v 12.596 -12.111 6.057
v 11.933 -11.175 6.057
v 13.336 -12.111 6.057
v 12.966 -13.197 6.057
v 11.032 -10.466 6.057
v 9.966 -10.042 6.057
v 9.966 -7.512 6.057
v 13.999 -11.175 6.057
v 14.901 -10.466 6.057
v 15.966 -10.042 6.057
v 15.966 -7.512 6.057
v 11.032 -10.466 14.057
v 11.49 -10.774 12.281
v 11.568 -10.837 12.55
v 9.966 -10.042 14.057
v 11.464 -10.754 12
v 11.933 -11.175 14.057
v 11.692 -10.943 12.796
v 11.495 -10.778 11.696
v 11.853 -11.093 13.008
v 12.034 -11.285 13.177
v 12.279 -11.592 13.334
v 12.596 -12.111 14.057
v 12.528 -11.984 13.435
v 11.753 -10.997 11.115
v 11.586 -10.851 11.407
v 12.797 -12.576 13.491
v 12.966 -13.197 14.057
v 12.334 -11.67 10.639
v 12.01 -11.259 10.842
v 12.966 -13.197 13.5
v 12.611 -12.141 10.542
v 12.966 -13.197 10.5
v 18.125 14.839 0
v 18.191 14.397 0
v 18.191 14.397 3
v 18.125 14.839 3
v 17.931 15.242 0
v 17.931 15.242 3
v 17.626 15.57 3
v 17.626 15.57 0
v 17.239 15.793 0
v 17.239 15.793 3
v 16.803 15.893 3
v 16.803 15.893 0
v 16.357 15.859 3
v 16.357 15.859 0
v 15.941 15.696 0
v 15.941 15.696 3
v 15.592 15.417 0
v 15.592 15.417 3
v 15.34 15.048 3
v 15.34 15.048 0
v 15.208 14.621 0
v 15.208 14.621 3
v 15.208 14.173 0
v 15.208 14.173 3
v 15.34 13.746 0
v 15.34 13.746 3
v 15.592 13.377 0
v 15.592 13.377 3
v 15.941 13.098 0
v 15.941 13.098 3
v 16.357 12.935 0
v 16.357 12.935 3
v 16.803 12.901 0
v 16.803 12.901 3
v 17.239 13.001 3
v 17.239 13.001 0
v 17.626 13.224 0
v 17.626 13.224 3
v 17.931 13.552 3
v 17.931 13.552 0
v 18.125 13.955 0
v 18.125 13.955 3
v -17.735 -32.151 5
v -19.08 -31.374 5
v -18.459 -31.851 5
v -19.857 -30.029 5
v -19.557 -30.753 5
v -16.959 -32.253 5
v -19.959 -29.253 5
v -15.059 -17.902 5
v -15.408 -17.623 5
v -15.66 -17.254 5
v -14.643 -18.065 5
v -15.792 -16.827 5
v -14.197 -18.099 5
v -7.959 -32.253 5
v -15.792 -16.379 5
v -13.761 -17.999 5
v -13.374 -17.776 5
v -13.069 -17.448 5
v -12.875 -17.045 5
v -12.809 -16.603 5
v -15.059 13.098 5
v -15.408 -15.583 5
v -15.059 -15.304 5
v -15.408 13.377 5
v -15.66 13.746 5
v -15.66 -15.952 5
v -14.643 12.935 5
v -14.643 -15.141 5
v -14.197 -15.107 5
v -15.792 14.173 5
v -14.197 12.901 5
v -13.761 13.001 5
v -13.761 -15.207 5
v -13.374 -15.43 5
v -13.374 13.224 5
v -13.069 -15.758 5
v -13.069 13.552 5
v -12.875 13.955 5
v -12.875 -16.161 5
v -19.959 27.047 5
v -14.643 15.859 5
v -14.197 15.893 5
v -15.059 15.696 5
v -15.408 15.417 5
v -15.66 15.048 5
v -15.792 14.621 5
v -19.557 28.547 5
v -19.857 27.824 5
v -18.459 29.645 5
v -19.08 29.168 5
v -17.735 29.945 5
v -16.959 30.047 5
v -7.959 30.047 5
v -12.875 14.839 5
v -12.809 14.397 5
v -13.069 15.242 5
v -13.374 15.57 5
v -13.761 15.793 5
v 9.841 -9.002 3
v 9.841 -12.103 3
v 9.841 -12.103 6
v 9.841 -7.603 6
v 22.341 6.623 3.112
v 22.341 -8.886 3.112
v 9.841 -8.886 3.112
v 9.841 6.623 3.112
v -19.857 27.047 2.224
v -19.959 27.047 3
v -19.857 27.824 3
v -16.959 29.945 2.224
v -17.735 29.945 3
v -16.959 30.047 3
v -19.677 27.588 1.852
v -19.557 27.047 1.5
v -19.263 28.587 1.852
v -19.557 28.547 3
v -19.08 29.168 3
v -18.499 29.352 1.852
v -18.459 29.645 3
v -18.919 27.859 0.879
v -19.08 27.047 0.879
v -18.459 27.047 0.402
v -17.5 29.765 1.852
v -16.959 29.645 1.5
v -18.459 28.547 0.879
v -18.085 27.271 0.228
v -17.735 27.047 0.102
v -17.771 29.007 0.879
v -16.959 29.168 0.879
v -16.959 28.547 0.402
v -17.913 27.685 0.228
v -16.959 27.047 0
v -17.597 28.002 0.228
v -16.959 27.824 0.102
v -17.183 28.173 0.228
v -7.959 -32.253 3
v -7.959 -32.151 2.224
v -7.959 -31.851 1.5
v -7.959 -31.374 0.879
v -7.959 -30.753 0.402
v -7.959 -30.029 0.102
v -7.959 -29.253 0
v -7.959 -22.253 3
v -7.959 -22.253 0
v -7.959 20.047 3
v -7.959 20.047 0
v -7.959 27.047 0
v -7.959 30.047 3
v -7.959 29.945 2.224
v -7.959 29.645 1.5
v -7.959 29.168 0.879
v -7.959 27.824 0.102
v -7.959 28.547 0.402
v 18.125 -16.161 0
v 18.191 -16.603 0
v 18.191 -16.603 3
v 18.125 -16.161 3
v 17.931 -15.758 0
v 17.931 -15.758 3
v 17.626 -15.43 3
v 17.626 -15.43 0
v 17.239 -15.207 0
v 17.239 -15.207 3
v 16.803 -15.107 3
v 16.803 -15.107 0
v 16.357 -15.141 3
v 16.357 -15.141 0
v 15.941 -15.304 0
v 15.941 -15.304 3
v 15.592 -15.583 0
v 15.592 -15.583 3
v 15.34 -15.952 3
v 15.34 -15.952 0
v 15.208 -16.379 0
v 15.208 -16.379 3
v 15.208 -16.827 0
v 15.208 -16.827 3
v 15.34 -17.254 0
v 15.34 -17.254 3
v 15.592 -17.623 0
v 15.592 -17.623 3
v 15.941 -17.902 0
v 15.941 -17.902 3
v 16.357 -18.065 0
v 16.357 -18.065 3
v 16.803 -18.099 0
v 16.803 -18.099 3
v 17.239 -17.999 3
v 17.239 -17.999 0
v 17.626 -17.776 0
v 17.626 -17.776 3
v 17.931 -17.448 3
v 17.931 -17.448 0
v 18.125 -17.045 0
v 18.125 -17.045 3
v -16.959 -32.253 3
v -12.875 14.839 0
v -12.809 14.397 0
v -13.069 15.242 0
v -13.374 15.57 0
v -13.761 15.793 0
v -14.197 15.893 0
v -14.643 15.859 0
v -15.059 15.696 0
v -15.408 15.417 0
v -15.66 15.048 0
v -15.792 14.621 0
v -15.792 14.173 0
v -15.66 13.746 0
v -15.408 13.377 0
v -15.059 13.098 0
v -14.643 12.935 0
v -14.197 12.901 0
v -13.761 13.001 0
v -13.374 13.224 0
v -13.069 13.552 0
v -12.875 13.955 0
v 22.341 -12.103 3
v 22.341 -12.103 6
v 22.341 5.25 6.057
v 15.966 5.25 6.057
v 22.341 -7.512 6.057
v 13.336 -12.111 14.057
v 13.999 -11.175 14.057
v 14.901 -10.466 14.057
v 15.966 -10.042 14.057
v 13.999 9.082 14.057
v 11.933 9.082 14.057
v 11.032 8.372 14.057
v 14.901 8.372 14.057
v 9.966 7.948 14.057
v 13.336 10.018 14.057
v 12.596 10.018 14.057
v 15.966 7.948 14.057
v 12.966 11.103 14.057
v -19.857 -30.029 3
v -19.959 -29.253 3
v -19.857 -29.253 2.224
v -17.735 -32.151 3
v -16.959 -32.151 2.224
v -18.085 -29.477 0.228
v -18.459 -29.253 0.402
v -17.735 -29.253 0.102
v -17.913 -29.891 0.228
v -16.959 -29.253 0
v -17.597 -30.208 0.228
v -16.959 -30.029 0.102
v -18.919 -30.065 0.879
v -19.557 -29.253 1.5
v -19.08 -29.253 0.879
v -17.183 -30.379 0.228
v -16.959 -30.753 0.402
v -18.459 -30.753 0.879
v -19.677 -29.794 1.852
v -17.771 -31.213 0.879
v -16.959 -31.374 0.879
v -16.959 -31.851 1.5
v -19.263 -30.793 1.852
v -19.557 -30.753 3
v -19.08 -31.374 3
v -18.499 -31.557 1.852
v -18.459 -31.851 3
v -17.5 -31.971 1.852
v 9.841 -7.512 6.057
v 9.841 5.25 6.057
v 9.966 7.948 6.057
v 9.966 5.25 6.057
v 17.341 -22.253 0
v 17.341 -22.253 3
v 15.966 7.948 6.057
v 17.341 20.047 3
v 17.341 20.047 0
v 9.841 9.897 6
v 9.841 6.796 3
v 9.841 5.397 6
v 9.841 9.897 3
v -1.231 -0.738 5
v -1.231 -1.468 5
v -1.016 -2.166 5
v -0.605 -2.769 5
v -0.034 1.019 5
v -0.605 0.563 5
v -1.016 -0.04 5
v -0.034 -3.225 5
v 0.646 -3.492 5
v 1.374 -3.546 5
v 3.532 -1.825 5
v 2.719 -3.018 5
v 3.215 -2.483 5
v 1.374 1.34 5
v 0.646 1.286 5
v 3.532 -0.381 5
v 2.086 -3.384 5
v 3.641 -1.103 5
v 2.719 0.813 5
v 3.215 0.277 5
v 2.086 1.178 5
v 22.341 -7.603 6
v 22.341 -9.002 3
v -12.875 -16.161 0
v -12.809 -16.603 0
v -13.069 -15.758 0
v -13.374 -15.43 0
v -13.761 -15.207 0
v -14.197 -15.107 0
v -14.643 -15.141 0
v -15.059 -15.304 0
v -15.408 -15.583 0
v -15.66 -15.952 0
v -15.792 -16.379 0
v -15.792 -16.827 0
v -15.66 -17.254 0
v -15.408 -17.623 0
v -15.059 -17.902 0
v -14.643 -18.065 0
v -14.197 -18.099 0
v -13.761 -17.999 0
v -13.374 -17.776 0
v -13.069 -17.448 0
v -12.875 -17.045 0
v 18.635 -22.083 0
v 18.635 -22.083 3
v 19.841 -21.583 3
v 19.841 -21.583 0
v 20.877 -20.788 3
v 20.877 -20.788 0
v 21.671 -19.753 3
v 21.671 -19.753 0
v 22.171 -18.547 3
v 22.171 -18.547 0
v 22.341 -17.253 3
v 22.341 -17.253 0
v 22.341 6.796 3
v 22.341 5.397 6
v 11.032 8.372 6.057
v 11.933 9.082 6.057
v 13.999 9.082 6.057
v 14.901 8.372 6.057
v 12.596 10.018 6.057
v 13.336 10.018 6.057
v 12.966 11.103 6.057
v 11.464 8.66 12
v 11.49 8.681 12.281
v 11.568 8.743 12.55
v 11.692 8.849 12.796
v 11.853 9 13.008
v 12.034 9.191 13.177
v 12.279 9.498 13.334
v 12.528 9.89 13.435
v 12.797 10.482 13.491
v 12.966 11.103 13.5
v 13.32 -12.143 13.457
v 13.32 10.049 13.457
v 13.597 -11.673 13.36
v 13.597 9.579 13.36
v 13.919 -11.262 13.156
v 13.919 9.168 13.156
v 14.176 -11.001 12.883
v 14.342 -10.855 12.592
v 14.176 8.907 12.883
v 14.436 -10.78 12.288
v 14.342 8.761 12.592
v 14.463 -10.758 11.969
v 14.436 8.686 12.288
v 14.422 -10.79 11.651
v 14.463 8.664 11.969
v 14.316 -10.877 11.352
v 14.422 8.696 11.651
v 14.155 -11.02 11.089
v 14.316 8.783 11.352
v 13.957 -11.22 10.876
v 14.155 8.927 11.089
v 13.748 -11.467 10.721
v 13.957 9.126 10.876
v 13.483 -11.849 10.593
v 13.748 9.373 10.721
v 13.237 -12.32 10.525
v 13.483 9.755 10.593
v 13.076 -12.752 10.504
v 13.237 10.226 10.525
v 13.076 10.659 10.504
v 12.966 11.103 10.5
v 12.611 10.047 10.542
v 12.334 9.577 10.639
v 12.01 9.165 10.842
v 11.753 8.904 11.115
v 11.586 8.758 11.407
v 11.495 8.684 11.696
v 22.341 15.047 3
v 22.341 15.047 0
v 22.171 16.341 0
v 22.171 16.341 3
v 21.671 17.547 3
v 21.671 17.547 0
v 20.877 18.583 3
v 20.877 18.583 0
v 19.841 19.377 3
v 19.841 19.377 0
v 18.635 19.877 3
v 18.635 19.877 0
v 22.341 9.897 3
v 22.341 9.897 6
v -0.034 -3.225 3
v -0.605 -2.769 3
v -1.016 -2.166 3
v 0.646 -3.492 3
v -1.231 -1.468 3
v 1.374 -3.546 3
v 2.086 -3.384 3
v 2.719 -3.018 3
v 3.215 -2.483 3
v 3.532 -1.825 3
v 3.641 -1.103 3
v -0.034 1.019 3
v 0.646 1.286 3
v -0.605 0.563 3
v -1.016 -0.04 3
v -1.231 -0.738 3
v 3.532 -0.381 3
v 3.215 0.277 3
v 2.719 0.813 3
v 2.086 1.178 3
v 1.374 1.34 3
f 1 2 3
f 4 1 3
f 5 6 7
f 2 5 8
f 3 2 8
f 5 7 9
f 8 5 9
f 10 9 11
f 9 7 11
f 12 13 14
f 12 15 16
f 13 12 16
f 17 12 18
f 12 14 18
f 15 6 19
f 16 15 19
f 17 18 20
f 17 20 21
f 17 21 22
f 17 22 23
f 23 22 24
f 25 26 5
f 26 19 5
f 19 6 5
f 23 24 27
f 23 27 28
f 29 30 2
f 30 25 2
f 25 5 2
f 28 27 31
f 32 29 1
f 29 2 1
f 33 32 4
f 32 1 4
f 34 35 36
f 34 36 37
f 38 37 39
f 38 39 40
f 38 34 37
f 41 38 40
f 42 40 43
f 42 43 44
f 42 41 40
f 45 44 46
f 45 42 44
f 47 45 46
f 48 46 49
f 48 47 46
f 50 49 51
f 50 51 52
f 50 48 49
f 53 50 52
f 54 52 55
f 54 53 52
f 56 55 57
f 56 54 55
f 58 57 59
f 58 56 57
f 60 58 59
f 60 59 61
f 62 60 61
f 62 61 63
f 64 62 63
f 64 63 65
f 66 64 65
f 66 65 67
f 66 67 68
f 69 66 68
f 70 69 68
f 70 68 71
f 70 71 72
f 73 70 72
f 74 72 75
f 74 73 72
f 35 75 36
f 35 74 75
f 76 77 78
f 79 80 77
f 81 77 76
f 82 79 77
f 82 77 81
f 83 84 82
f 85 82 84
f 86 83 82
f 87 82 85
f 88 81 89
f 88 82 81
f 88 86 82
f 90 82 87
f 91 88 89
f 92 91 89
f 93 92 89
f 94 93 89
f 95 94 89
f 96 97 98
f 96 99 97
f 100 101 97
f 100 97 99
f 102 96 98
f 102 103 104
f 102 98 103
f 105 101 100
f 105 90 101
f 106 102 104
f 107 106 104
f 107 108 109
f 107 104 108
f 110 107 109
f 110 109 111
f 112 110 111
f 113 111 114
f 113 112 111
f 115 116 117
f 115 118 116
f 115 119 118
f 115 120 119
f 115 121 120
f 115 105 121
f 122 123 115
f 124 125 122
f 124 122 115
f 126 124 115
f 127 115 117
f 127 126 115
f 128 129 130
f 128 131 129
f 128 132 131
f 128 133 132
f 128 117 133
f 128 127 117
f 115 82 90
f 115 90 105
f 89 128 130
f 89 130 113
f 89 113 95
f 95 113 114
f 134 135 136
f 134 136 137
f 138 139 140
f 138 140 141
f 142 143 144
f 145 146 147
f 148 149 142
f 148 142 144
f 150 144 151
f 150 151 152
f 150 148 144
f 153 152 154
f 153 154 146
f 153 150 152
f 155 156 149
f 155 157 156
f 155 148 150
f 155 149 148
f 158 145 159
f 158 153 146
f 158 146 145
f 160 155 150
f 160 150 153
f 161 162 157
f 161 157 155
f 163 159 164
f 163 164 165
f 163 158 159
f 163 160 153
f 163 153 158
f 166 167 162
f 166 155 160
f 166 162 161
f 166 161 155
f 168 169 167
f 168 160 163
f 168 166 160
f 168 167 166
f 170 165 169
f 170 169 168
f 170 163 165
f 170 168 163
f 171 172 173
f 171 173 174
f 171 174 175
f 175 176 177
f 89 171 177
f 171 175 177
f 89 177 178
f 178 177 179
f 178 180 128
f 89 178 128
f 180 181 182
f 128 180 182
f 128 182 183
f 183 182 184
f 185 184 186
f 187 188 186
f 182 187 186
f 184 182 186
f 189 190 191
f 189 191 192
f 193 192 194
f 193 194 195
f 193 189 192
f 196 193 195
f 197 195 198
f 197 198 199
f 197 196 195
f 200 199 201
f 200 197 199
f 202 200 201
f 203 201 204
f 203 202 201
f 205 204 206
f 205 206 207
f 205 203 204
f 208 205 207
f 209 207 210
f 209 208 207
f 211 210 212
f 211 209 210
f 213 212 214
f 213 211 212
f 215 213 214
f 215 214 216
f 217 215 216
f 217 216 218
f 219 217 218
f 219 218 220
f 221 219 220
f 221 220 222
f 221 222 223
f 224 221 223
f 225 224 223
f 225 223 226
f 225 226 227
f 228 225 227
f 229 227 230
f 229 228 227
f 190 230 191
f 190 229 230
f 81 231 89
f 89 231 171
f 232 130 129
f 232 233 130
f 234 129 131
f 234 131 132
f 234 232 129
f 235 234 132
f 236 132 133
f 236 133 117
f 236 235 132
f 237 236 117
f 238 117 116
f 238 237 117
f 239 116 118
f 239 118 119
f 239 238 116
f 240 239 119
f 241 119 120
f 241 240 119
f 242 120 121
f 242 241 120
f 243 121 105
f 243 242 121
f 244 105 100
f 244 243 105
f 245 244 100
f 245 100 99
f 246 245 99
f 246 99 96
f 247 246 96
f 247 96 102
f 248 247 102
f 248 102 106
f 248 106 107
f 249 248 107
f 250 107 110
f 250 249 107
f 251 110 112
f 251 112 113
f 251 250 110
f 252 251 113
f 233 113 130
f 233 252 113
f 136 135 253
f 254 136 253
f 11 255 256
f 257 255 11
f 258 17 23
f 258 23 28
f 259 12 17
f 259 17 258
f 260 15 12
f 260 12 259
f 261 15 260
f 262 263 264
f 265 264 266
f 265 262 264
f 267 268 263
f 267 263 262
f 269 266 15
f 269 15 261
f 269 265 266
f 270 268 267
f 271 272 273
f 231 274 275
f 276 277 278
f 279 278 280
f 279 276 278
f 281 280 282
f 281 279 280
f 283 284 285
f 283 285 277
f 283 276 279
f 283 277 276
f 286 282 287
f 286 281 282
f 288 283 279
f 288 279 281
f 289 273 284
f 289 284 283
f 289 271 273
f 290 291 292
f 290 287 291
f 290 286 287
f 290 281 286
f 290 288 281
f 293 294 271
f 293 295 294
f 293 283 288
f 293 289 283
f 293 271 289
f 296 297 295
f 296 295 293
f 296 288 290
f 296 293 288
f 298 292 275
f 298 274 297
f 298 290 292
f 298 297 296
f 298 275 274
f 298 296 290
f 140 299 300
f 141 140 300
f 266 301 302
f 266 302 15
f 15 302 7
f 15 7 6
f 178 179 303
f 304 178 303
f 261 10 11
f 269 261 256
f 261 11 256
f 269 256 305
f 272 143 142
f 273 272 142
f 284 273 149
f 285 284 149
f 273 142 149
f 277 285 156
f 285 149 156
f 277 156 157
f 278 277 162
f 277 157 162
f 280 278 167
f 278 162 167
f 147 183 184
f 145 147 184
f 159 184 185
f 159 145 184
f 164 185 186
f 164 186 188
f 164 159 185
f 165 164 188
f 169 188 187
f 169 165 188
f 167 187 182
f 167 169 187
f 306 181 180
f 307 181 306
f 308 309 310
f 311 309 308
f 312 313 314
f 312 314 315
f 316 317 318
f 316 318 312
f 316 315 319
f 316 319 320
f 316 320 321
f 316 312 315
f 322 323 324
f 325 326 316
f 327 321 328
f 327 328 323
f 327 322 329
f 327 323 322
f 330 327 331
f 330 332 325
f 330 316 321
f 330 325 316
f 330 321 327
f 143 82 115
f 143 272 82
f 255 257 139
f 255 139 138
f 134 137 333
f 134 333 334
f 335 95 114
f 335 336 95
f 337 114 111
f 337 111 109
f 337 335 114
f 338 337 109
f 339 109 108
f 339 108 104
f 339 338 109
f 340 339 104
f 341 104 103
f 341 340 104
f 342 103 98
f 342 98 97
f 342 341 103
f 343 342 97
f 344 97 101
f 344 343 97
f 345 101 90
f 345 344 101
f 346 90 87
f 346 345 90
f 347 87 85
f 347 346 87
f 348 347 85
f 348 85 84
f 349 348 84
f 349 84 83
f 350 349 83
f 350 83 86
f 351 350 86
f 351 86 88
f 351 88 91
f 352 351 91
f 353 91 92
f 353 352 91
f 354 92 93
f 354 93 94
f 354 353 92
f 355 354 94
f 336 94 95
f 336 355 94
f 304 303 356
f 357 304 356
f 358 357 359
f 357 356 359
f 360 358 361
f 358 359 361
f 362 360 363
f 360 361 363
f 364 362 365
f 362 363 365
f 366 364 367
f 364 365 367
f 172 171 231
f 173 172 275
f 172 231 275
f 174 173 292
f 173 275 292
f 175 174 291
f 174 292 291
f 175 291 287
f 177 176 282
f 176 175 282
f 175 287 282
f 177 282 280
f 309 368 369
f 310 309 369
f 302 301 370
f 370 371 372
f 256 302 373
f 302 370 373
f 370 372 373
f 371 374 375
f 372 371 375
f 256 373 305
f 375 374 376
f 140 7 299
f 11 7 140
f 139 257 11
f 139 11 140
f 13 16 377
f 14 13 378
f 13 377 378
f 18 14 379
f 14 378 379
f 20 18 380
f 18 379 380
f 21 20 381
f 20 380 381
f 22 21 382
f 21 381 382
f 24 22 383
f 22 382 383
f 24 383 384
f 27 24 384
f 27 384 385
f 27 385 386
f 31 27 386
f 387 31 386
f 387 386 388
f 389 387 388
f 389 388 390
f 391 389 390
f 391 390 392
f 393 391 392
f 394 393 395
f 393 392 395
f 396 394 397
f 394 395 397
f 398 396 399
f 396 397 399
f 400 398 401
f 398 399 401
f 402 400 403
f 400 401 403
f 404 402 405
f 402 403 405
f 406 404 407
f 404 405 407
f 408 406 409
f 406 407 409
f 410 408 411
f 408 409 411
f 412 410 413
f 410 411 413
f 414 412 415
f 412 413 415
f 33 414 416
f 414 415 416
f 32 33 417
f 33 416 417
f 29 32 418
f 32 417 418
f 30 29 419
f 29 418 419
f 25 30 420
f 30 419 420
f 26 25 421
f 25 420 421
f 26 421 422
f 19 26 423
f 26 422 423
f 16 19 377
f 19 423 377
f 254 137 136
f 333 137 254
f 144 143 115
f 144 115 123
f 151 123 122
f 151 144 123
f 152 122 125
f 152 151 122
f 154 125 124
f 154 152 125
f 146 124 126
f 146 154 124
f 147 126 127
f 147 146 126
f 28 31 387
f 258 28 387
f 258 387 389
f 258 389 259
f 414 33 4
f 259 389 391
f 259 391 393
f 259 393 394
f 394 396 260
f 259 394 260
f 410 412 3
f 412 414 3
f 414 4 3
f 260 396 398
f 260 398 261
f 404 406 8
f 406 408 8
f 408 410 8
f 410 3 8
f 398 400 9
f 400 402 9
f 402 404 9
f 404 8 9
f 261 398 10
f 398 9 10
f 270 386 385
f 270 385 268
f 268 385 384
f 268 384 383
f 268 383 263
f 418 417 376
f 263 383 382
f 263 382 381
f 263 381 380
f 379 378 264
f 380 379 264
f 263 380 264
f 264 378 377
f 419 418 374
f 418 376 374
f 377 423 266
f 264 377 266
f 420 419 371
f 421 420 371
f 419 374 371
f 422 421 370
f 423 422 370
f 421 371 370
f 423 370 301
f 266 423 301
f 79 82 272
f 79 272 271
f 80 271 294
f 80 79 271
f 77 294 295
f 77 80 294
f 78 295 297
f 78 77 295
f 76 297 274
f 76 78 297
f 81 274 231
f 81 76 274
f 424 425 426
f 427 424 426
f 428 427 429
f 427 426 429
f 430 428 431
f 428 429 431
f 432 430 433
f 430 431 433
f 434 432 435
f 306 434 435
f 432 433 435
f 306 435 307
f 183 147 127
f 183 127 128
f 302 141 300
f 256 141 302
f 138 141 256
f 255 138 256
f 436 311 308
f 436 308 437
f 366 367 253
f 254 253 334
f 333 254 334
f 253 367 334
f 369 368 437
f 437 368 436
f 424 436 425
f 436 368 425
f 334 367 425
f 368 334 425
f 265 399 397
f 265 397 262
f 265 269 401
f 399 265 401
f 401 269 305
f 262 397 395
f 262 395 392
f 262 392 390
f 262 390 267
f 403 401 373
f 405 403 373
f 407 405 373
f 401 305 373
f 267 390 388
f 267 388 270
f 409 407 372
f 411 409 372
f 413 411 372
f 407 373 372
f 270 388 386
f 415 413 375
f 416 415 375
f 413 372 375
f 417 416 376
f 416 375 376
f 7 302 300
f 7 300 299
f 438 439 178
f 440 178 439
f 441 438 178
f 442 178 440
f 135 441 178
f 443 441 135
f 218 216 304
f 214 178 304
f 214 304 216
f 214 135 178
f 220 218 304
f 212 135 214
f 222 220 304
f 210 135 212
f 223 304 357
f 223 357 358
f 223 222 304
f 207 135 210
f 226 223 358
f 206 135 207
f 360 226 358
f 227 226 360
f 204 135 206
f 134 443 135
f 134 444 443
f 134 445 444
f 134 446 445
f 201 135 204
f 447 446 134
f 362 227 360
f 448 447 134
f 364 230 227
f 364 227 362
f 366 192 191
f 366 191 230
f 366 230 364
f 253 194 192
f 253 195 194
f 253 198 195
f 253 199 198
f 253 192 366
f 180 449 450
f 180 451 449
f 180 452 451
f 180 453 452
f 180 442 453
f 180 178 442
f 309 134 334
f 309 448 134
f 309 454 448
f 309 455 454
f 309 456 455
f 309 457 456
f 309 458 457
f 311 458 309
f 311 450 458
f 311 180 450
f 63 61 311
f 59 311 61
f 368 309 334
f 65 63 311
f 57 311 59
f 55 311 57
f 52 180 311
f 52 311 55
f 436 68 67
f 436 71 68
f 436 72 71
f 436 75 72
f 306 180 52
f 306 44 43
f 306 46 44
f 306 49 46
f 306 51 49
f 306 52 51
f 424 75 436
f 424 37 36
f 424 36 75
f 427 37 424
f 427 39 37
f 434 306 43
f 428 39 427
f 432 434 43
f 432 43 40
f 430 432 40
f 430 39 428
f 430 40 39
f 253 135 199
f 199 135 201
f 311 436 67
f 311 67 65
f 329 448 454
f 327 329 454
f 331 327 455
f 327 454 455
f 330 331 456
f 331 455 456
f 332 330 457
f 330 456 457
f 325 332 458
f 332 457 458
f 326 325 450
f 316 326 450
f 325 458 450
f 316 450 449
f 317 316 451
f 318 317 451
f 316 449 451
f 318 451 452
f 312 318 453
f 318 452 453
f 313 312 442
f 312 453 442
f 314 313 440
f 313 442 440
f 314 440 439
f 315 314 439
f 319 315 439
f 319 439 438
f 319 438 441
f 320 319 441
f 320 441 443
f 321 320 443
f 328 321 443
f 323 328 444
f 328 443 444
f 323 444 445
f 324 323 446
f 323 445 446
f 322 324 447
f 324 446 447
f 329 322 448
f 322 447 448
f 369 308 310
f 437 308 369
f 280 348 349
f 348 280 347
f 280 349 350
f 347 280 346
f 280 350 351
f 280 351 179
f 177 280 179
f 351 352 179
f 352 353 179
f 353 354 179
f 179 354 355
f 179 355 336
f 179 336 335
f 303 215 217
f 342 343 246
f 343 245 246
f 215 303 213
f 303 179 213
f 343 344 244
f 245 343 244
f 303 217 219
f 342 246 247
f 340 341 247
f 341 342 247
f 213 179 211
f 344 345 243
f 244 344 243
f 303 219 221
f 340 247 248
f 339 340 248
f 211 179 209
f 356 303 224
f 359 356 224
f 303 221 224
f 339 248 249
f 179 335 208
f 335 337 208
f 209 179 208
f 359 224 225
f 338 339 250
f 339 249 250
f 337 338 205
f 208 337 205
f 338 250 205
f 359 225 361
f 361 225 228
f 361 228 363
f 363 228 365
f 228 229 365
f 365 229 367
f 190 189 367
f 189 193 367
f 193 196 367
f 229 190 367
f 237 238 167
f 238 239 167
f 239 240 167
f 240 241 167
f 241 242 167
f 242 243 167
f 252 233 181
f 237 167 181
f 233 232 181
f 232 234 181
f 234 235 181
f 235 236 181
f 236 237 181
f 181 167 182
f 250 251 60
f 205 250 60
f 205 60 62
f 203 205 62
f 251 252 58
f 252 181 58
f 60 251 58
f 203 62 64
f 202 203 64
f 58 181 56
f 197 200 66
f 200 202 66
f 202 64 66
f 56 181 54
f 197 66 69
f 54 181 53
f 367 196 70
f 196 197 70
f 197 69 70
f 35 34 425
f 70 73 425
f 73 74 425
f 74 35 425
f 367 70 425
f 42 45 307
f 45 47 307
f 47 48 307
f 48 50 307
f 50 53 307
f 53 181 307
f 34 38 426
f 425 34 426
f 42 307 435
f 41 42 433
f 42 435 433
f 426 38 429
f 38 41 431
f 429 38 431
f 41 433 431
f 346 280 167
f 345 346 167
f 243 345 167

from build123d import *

# Parameters (mm, degrees)
F1_R          = 1.5
F1_R_2        = 2.45
F2_DEPTH      = 3
F3_W          = 12
F3_H          = 42.3
F3_R          = 3.3
F3_R_2        = 1.5
F4_DEPTH      = 2
F1_W          = 12
F1_H          = 10
F5_DEPTH      = 2
F6_R          = 3
F3_R_3        = 2.45
F7_DEPTH      = 2
F7_DEPTH_BACK = 3
F8_DEPTH      = 3
F9_T1_DEPTH   = 56.3
F9_T3_DEPTH   = 16.5
F9_T6_ANGLE   = 90
F9_T8_ANGLE   = 90
F10_W         = 12.5
F10_H         = 22
F11_DEPTH     = 3
F13_DEPTH     = 13
F15_DEPTH     = 12.5
F16_W         = 6
F16_H         = 12.7620736001
F17_DEPTH     = 8
F19_D         = 3
F19_DEPTH     = 42.3
F19_START     = 11.4989038
F19_TIP       = 0.9012909285


# Not quite as in the source:
# - a fillet or chamfer that OpenCascade refuses, or shapes differently, is made with other operations: its cross-section is extruded or revolved along the edge and cut away or added
# - a feature names something its author has since deleted; it is built from what else it names


with BuildPart() as f2:
    # F1 (on Top) → F2 (new body)
    with BuildSketch(Plane.XY):
        with BuildLine():
            Line((-7.9588235294, 20.0470588235), (-19.9588235294, 20.0470588235))
            Line((-19.9588235294, 20.0470588235), (-19.9588235294, -22.2529411765))
            Line((-19.9588235294, -22.2529411765), (-7.9588235294, -22.2529411765))
            Line((-7.9588235294, -22.2529411765), (17.3411764706, -22.2529411765))
            ThreePointArc((17.3411764706, -22.2529411765), (20.8767103765, -20.7884750824), (22.3411764706, -17.2529411765))
            Line((22.3411764706, -17.2529411765), (22.3411764706, 15.0470588235))
            ThreePointArc((22.3411764706, 15.0470588235), (20.8767103765, 18.5825927295), (17.3411764706, 20.0470588235))
            Line((17.3411764706, 20.0470588235), (-7.9588235294, 20.0470588235))
        make_face()
        with Locations((-14.3088235294, -16.6029411765)):
            Circle(F1_R, mode=Mode.SUBTRACT)
        with Locations((1.1911764706, -1.1029411765)):
            Circle(F1_R_2, mode=Mode.SUBTRACT)
        with Locations((16.6911764706, -16.6029411765)):
            Circle(F1_R, mode=Mode.SUBTRACT)
        with Locations((-14.3088235294, 14.3970588235)):
            Circle(F1_R, mode=Mode.SUBTRACT)
        with Locations((16.6911764706, 14.3970588235)):
            Circle(F1_R, mode=Mode.SUBTRACT)
    extrude(amount=F2_DEPTH)

    # F3 (on face) → F4 (join)
    with BuildSketch(Plane.XY.offset(3)):
        with Locations((-13.9588235294, -1.1029411765)):
            Rectangle(F3_W, F3_H)
        with Locations((-14.3088235294, -16.6029411765)):
            Circle(F3_R, mode=Mode.SUBTRACT)
        with Locations((-14.3088235294, 14.3970588235)):
            Circle(F3_R, mode=Mode.SUBTRACT)
        with Locations((-14.3088235294, 14.3970588235)):
            Circle(F3_R)
        with Locations((-14.3088235294, 14.3970588235)):
            Circle(F3_R_2, mode=Mode.SUBTRACT)
        with Locations((-14.3088235294, -16.6029411765)):
            Circle(F3_R)
        with Locations((-14.3088235294, -16.6029411765)):
            Circle(F3_R_2, mode=Mode.SUBTRACT)
    extrude(amount=F4_DEPTH)

    # F1 (on Top) → F5 (join)
    with BuildSketch(Plane.XY):
        with Locations((-13.9588235294, 25.0470588235)):
            Rectangle(F1_W, F1_H)
        with Locations((-13.9588235294, -27.2529411765)):
            Rectangle(F1_W, F1_H)
    extrude(amount=F5_DEPTH)

    # F6
    f6_edges = [f2.edges().sort_by_distance(p)[0] for p in [
        (-19.958824, -32.252941, 1),
        (-19.958824, 30.047059, 1),
    ]]
    fillet(f6_edges, radius=F6_R)

    # F3 (on face) → F7 (join, two sides)
    with BuildSketch(Plane.XY.offset(3)) as f7_sk:
        with Locations((1.1911764706, -1.1029411765)):
            Circle(F3_R_3)
    extrude(amount=F7_DEPTH)
    extrude(f7_sk.sketch, amount=-F7_DEPTH_BACK)

    # F8 (add): faces of the model
    f8_faces = [f2.faces().sort_by_distance(p)[0] for p in [
        (-13.8716348016, 24.9762285246, 2),
        (-13.8716348016, -27.1821108776, 2),
    ]]
    extrude(f8_faces, amount=F8_DEPTH)

    # F9: fillet of radius 3 on 5 edges, made by hand

    # F9_s2 → F9_t1 (cut)
    with BuildSketch(Plane.XZ.offset(-27.0470588235)):
        with BuildLine():
            ThreePointArc((-19.9588235294, 3), (-19.080143873, 0.8786796564), (-16.9588235294, 0))
            Line((-16.9588235294, 0), (-19.9588235294, 0))
            Line((-19.9588235294, 0), (-19.9588235294, 3))
        make_face()
    extrude(amount=F9_T1_DEPTH, mode=Mode.SUBTRACT)

    # F9_s4 → F9_t3 (cut)
    with BuildSketch(Plane.YZ.offset(-16.9588235294)):
        with BuildLine():
            ThreePointArc((30.0470588235, 3), (29.1683791671, 0.8786796564), (27.0470588235, 0))
            Line((27.0470588235, 0), (30.0470588235, 0))
            Line((30.0470588235, 0), (30.0470588235, 3))
        make_face()
        with BuildLine():
            ThreePointArc((-32.2529411765, 3), (-31.37426152, 0.8786796564), (-29.2529411765, 0))
            Line((-29.2529411765, 0), (-32.2529411765, 0))
            Line((-32.2529411765, 0), (-32.2529411765, 3))
        make_face()
    extrude(amount=F9_T3_DEPTH, mode=Mode.SUBTRACT)

    # F9_s5 → F9_t6 (revolve, cut)
    with BuildSketch(Plane.XZ.offset(-27.0470588235)):
        with BuildLine():
            ThreePointArc((-19.9588235294, 3), (-19.080143873, 0.8786796564), (-16.9588235294, 0))
            Line((-16.9588235294, 0), (-19.9588235294, 0))
            Line((-19.9588235294, 0), (-19.9588235294, 3))
        make_face()
    revolve(axis=Axis((-16.9588235294, 27.0470588235, 0), (0, 0, -1)), revolution_arc=F9_T6_ANGLE, mode=Mode.SUBTRACT)

    # F9_s7 → F9_t8 (revolve, cut)
    with BuildSketch(Plane.XZ.offset(29.2529411765)):
        with BuildLine():
            ThreePointArc((-16.9588235294, 0), (-19.080143873, 0.8786796564), (-19.9588235294, 3))
            Line((-19.9588235294, 3), (-19.9588235294, 0))
            Line((-19.9588235294, 0), (-16.9588235294, 0))
        make_face()
    revolve(axis=Axis((-16.9588235294, -29.2529411765, 0), (0, 0, 1)), revolution_arc=F9_T8_ANGLE, mode=Mode.SUBTRACT)

    # F10 (on face) → F11 (join)
    with BuildSketch(Plane.XY.offset(3)):
        with Locations((16.0911764706, -1.1029411765)):
            Rectangle(F10_W, F10_H)
    extrude(amount=F11_DEPTH)

    # F12 (on face) → F13 (cut)
    with BuildSketch(Plane.YZ.offset(22.3411764706)):
        Polygon((5.3970588235, 6), (-7.6029411765, 6), (-9.0018641509, 3), (6.795981798, 3), align=None)
    extrude(amount=-F13_DEPTH, mode=Mode.SUBTRACT)


with BuildPart() as f15:
    # F14 (on face) → F15 (new body)
    with BuildSketch(Plane.YZ.offset(22.3411764706)):
        Polygon((6.6231914472, 3.1115159904), (5.2496820965, 6.0570162982), (-7.5123915035, 6.0570162982), (-8.8859008542, 3.1115159904), align=None)
    extrude(amount=-F15_DEPTH)

    # F16 (on face) → F17 (join)
    with BuildSketch(Plane.XY.offset(6.0570162982)):
        with BuildLine():
            ThreePointArc((12.9661764706, 11.1031076104), (11.9330087808, 9.0817074362), (9.9661764706, 7.9481004483))
            Line((9.9661764706, 7.9481004483), (9.9661764706, 5.2496820965))
            Line((9.9661764706, 5.2496820965), (15.9661764706, 5.2496820965))
            Line((15.9661764706, 5.2496820965), (15.9661764706, 7.9481004483))
            ThreePointArc((15.9661764706, 7.9481004483), (13.9993441603, 9.0817074362), (12.9661764706, 11.1031076104))
        make_face()
        with Locations((12.9661764706, -1.1313547035)):
            Rectangle(F16_W, F16_H)
        with BuildLine():
            Line((15.9661764706, -7.5123915035), (9.9661764706, -7.5123915035))
            Line((9.9661764706, -7.5123915035), (9.9661764706, -10.0418852275))
            ThreePointArc((9.9661764706, -10.0418852275), (11.9330087808, -11.1754922153), (12.9661764706, -13.1968923896))
            ThreePointArc((12.9661764706, -13.1968923896), (13.9993441603, -11.1754922153), (15.9661764706, -10.0418852275))
            Line((15.9661764706, -10.0418852275), (15.9661764706, -7.5123915035))
        make_face()
    extrude(amount=F17_DEPTH)

    # F19
    # its depths count from where the whole tool has entered the part; down to there all is cleared
    with Locations(Plane.XZ.offset(22.2529411765).offset(-F19_START)):
        with Locations((12.9636181518, 12)):
            Hole(F19_D / 2, depth=F19_DEPTH)
            with Locations((0, 0, -(F19_DEPTH + F19_TIP / 2))):  # 118° drill point
                Cone(0, F19_D / 2, F19_TIP, mode=Mode.SUBTRACT)


solid = Compound([f2.part, f15.part])
